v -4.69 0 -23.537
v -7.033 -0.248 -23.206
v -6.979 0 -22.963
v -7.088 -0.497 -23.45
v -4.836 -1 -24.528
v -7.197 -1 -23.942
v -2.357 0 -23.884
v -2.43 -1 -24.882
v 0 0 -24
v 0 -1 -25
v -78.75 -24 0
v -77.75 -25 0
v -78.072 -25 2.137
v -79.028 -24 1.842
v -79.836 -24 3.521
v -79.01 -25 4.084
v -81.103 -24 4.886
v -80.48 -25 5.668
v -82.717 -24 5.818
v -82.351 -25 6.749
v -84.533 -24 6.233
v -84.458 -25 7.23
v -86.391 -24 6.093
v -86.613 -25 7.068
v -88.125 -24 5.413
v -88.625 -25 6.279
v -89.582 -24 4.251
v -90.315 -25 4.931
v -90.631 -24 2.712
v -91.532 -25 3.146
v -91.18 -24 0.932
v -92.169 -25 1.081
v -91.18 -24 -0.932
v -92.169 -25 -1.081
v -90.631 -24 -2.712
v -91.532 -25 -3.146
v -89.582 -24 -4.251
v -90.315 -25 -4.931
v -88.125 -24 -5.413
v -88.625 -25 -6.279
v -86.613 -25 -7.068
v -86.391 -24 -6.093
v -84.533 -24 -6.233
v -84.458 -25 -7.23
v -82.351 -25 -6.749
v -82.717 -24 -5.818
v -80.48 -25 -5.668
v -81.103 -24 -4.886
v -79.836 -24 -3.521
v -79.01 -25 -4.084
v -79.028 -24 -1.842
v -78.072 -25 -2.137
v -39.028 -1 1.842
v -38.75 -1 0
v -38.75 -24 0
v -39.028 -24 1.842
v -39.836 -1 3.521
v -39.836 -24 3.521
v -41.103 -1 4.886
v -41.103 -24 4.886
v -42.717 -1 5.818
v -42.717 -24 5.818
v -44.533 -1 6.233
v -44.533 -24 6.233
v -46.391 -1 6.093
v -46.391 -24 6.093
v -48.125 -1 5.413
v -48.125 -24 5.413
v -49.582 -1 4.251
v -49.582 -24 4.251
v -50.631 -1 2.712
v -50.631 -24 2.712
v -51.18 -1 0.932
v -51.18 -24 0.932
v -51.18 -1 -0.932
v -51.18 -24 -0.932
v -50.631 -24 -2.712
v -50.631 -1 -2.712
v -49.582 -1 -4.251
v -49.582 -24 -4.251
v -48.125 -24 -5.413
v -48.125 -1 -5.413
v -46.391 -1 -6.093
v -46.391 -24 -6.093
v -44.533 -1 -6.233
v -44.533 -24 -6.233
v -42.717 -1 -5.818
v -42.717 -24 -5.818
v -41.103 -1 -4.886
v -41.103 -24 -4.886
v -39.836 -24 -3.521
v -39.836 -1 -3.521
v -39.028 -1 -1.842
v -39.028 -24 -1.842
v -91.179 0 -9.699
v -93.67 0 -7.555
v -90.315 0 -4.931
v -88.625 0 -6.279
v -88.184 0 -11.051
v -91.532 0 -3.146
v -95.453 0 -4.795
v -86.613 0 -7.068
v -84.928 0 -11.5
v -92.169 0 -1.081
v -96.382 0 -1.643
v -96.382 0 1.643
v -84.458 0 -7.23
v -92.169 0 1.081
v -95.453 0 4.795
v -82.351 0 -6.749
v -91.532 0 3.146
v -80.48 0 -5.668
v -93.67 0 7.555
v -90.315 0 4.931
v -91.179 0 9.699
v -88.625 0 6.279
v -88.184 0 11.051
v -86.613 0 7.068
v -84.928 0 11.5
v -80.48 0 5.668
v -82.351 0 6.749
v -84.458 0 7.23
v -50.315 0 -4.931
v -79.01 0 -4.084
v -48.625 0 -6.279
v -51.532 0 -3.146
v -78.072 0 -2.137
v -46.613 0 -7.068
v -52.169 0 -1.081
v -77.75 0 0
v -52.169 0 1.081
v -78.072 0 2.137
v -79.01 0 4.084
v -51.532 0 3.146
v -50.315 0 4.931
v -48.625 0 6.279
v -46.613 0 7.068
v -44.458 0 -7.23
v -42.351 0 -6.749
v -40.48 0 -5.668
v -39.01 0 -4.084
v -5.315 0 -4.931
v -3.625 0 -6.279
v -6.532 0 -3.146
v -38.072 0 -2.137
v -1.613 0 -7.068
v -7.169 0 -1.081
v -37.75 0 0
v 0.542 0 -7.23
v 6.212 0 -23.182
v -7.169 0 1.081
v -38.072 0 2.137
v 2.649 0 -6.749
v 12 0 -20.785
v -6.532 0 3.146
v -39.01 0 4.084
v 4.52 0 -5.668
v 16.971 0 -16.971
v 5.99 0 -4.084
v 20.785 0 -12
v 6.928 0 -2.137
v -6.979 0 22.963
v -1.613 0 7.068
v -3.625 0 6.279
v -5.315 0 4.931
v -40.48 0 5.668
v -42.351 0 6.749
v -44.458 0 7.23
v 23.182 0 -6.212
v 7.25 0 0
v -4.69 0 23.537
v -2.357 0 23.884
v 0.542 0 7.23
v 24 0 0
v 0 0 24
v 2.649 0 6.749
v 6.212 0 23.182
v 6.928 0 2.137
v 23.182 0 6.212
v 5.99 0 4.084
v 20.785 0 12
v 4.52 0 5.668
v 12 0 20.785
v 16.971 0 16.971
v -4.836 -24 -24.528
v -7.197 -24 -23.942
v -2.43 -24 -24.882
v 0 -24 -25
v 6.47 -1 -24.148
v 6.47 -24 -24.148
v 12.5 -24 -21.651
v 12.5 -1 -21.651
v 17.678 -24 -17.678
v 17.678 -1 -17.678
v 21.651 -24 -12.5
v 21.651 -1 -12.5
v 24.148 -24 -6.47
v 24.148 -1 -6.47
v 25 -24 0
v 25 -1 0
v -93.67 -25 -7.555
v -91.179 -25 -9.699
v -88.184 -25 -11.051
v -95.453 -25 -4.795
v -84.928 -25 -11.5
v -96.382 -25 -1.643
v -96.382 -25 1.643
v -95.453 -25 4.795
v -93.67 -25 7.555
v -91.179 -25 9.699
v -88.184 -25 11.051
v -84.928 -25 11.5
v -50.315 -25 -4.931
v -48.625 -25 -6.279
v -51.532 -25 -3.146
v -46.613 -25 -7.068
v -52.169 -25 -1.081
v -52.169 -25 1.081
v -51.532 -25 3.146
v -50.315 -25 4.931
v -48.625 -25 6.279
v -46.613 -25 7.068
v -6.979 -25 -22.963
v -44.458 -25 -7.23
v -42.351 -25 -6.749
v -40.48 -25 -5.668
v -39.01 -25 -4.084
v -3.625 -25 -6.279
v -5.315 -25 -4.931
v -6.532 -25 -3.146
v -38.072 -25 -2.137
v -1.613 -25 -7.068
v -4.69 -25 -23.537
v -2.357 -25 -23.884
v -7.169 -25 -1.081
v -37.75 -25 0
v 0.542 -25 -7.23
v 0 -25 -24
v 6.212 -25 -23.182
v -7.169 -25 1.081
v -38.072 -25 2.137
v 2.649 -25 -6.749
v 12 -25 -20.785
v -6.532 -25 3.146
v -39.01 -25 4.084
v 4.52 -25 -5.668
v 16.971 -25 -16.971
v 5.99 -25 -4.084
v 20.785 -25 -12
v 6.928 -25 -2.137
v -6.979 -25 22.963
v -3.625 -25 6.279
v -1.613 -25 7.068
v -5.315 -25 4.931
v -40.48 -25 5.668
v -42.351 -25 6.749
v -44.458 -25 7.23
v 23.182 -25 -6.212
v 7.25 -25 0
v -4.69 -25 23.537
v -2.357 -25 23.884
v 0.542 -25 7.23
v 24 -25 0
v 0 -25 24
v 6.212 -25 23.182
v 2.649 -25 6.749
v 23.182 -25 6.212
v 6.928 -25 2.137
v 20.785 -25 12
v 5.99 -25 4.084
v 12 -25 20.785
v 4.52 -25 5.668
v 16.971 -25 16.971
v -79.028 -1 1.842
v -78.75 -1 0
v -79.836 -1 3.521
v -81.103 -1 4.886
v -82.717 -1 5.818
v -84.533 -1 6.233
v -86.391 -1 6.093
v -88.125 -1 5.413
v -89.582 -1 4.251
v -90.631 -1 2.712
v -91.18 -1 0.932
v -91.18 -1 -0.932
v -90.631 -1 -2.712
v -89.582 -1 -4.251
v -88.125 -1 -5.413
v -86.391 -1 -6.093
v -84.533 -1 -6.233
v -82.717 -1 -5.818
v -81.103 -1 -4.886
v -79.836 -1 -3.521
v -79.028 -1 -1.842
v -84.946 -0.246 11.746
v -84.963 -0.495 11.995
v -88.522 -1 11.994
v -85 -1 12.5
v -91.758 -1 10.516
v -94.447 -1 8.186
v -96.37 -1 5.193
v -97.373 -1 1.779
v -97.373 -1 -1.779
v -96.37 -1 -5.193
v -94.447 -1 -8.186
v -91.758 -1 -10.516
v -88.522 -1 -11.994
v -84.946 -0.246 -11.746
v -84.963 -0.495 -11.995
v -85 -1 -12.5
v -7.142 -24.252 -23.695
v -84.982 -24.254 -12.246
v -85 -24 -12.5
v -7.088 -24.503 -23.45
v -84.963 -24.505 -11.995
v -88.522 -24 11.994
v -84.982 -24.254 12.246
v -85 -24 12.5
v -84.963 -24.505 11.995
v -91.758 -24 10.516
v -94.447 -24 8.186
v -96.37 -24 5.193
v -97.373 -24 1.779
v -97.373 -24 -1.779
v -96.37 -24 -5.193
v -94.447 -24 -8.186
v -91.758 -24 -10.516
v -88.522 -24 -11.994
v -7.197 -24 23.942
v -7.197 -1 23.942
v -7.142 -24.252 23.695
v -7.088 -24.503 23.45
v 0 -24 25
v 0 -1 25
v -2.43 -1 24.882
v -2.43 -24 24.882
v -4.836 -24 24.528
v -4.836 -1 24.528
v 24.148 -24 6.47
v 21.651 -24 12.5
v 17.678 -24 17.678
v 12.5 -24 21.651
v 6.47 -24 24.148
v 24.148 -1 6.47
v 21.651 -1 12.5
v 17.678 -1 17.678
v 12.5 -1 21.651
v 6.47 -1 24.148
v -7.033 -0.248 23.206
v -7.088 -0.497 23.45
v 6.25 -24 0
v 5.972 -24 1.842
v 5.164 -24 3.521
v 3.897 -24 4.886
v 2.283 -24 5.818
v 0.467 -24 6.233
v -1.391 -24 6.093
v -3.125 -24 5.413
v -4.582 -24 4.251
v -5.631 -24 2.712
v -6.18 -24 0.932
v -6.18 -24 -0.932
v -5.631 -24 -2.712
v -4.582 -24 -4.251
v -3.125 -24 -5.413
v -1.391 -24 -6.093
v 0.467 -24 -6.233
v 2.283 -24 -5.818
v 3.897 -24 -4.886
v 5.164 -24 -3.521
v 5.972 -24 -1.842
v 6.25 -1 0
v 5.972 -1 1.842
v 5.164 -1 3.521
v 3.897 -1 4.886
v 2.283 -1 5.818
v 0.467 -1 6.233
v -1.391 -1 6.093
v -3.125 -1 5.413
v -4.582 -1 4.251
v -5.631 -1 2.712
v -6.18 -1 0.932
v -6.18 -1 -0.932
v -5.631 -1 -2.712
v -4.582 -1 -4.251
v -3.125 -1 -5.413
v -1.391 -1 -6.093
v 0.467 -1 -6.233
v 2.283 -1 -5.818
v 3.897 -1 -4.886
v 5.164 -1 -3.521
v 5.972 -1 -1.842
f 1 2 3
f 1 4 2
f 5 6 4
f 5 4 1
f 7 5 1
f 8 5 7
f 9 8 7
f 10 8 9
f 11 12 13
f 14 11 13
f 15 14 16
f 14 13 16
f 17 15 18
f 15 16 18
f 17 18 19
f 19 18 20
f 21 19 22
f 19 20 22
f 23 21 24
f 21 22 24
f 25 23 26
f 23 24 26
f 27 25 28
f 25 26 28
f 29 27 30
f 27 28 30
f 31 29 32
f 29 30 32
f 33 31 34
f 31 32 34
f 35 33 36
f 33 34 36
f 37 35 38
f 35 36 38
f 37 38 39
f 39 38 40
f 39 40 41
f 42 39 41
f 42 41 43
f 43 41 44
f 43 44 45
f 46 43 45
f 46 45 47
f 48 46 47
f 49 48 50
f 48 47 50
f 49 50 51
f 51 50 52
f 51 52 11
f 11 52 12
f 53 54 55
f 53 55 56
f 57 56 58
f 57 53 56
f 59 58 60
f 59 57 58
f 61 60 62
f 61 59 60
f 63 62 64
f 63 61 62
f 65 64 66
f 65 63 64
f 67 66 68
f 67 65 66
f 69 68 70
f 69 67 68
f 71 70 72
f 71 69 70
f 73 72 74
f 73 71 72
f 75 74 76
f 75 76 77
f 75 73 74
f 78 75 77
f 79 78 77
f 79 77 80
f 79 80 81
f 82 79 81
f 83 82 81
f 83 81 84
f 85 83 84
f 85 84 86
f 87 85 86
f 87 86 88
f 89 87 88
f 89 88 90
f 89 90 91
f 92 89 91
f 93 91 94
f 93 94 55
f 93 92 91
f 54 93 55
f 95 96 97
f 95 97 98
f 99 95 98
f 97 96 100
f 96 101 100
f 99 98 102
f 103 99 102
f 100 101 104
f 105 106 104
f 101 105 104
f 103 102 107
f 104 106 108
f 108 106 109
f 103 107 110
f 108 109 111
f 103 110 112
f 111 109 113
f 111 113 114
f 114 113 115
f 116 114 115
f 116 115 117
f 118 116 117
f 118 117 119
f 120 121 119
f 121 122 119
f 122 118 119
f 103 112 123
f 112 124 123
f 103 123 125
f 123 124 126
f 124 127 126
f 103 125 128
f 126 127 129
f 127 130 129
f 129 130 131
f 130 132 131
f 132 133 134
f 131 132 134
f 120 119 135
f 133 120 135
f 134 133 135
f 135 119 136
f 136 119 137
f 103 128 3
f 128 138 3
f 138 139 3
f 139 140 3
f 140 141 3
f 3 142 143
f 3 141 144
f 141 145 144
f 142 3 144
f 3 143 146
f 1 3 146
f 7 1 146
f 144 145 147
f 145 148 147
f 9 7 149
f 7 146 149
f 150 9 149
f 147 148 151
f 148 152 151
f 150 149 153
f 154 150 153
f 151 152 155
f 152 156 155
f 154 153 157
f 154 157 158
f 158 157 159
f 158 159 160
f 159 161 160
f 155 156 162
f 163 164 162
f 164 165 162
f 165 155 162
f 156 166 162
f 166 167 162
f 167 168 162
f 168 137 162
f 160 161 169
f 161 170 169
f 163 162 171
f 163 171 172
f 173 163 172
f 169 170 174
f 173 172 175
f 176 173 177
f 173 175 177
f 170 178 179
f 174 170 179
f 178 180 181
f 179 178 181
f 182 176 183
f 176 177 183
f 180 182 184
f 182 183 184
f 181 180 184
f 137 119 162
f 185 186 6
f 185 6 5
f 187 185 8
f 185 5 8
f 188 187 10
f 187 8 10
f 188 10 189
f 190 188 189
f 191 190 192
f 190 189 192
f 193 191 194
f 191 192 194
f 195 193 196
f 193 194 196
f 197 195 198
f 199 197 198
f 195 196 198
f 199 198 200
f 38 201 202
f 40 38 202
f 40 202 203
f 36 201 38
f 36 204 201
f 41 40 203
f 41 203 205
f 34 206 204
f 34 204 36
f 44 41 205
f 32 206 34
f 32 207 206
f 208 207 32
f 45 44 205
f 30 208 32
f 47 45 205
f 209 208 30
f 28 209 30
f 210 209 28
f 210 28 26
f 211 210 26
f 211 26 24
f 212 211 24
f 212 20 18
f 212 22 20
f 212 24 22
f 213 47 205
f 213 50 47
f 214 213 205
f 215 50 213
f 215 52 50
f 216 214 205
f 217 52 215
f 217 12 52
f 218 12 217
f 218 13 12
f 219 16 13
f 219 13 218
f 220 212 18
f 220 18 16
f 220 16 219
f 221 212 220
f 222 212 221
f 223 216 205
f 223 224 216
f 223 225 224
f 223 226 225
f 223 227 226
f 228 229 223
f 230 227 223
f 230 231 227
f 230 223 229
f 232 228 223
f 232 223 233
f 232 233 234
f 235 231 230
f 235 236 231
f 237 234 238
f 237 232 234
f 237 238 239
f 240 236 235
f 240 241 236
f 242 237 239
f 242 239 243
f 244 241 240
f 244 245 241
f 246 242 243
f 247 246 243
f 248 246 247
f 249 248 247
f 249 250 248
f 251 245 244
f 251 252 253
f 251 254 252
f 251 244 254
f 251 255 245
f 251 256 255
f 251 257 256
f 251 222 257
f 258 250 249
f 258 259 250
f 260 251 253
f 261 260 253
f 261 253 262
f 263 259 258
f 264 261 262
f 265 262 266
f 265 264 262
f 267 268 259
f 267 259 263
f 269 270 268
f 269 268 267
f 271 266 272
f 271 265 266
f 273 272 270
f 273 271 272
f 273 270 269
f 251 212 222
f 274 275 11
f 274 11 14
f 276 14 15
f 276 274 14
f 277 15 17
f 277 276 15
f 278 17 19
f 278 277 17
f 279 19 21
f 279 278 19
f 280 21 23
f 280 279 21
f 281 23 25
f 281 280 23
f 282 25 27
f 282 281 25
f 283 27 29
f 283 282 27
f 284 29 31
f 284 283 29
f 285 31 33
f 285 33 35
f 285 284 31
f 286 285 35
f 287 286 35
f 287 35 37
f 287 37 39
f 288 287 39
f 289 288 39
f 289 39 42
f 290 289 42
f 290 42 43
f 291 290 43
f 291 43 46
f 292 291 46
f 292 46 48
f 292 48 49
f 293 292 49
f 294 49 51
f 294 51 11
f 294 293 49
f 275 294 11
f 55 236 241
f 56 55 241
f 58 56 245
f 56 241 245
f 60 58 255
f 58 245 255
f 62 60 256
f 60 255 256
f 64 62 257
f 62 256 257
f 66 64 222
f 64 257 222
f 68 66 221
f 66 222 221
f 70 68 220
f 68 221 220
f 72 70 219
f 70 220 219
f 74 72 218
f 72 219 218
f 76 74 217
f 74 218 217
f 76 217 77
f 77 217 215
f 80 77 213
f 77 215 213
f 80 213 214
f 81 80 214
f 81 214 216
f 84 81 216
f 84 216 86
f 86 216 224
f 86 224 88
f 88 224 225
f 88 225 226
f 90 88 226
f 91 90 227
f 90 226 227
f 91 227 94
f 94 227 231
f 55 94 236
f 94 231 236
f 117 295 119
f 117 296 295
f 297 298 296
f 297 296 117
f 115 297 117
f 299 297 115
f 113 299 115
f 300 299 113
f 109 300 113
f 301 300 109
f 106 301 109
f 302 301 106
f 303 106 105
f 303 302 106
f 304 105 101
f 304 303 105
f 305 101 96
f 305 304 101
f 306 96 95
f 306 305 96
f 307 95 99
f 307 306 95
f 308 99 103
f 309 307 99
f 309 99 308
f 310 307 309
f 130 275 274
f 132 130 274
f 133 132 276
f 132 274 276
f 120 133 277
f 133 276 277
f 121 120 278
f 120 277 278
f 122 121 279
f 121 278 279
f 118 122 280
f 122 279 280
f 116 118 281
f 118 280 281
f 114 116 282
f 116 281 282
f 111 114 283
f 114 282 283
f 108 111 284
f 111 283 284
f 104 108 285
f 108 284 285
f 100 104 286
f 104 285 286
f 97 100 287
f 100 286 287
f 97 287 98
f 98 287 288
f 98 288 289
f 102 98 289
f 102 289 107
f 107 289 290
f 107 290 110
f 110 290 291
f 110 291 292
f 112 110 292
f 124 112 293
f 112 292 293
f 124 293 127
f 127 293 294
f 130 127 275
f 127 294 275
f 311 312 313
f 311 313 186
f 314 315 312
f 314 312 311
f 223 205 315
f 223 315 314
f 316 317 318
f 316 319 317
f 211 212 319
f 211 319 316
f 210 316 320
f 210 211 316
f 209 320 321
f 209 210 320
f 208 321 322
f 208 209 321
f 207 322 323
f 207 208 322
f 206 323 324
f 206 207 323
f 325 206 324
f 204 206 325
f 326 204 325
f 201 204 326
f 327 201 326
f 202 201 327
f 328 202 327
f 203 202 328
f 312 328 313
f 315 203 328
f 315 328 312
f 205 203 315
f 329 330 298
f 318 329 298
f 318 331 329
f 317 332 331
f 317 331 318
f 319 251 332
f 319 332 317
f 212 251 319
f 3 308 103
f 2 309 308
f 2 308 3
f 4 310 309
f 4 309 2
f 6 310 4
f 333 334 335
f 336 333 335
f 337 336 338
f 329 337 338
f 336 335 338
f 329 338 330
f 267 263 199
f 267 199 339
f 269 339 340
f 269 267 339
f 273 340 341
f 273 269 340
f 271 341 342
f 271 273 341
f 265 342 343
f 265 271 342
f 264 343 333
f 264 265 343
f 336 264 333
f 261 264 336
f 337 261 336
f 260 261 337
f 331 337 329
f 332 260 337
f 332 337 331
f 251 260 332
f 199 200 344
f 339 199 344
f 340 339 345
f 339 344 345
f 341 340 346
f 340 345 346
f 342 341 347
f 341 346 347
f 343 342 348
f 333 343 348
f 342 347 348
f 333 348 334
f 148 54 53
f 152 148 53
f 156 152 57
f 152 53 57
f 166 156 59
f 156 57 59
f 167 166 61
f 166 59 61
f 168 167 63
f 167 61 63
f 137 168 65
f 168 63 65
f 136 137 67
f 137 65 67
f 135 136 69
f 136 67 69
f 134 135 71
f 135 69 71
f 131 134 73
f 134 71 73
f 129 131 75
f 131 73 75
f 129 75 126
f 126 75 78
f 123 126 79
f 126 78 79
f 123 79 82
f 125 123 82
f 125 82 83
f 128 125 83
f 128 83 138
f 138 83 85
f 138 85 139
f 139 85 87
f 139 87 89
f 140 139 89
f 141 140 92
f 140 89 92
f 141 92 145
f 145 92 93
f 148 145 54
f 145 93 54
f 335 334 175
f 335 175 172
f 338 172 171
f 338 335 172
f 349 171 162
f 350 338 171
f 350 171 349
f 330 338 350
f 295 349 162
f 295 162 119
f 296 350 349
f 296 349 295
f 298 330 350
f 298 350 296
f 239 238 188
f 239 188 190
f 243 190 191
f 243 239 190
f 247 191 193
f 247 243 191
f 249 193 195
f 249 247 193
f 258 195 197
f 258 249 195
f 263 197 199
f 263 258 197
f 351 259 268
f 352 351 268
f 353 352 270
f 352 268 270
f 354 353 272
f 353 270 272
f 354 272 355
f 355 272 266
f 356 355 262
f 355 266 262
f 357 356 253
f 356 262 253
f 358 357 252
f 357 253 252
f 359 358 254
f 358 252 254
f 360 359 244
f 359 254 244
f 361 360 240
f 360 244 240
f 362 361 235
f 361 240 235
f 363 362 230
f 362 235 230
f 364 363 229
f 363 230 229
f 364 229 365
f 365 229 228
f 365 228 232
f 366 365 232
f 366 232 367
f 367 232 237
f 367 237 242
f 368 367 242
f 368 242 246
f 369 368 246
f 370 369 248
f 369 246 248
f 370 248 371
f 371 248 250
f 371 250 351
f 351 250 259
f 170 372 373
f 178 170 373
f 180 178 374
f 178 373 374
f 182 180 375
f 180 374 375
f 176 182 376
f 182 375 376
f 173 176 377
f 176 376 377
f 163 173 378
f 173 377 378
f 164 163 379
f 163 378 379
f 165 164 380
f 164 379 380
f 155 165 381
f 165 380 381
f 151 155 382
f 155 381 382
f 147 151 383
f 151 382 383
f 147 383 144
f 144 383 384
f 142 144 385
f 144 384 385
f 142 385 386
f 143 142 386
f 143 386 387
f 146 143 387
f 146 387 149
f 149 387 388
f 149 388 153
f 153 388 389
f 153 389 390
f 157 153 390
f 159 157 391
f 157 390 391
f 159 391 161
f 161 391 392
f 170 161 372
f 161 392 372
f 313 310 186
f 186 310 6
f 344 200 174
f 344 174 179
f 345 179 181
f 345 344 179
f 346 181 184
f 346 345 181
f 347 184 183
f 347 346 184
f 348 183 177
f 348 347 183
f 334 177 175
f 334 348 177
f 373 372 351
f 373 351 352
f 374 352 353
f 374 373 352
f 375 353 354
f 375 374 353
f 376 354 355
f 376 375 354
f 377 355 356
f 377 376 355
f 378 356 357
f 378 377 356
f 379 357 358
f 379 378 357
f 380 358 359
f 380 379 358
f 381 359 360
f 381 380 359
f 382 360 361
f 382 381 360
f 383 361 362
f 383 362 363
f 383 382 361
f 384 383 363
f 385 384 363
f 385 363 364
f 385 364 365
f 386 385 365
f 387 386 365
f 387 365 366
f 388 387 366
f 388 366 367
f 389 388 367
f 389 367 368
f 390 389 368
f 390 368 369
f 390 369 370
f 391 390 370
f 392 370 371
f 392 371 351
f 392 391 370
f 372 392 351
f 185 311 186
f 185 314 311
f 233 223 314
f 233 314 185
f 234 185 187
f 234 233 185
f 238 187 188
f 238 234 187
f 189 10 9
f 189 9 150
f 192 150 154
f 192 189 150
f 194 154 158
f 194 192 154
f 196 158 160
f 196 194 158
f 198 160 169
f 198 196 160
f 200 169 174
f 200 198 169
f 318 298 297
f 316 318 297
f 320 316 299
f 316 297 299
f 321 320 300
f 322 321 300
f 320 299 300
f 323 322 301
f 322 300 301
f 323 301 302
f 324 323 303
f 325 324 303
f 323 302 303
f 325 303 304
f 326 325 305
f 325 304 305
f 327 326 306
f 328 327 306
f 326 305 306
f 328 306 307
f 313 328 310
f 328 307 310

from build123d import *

# Parameters (mm, degrees)
F0_R     = 6.25
F1_DEPTH = 25
F2_SIZE  = 1
F3_SIZE  = 1


with BuildPart() as f1:
    # F0 (on Front) → F1 (new body)
    with BuildSketch(Plane.XZ):
        with BuildLine():
            ThreePointArc((0, -25), (17.67767, -17.67767), (25, 0))
            ThreePointArc((25, 0), (17.67767, 17.67767), (0, 25))
            Line((0, 25), (-7.19729, 23.941575))
            ThreePointArc((-7.19729, 23.941575), (-25, 0), (-7.19729, -23.941575))
            Line((-7.19729, -23.941575), (0, -25))
        make_face()
        Circle(F0_R, mode=Mode.SUBTRACT)
        with BuildLine():
            Line((-7.19729, 23.941575), (0, 25))
            ThreePointArc((0, 25), (-3.63735, 24.733978), (-7.19729, 23.941575))
        make_face()
        with BuildLine():
            ThreePointArc((-7.19729, -23.941575), (-3.63735, -24.733978), (0, -25))
            Line((0, -25), (-7.19729, -23.941575))
        make_face()
        with BuildLine():
            ThreePointArc((-7.19729, -23.941575), (-25, 0), (-7.19729, 23.941575))
            Line((-7.19729, 23.941575), (-85, 12.5))
            ThreePointArc((-85, 12.5), (-76.161165, 8.838835), (-72.5, 0))
            ThreePointArc((-72.5, 0), (-76.161165, -8.838835), (-85, -12.5))
            Line((-85, -12.5), (-7.19729, -23.941575))
        make_face()
        with Locations((-45, 0)):
            Circle(F0_R, mode=Mode.SUBTRACT)
        with BuildLine():
            ThreePointArc((-72.5, 0), (-76.161165, 8.838835), (-85, 12.5))
            ThreePointArc((-85, 12.5), (-97.5, 0), (-85, -12.5))
            ThreePointArc((-85, -12.5), (-76.161165, -8.838835), (-72.5, 0))
        make_face()
        with Locations((-85, 0)):
            Circle(F0_R, mode=Mode.SUBTRACT)
    extrude(amount=F1_DEPTH)

    # F2
    f2_edges = [f1.edges().sort_by_distance(p)[0] for p in [
        (-3.63735, -25, 24.733978),
        (-46.098645, -25, 18.220787),
        (-97.5, -25, 0),
        (-46.098645, -25, -18.220787),
        (24.733978, -25, -3.63735),
        (-6.25, -25, 0),
        (-51.25, -25, 0),
        (-91.25, -25, 0),
    ]]
    chamfer(f2_edges, length=F2_SIZE)

    # F3
    f3_edges = [f1.edges().sort_by_distance(p)[0] for p in [
        (-3.63735, 0, 24.733978),
        (-46.098645, 0, 18.220787),
        (-97.5, 0, 0),
        (-46.098645, 0, -18.220787),
        (24.733978, 0, -3.63735),
        (-6.25, 0, 0),
        (-51.25, 0, 0),
        (-91.25, 0, 0),
    ]]
    chamfer(f3_edges, length=F3_SIZE)


solid = f1.part
